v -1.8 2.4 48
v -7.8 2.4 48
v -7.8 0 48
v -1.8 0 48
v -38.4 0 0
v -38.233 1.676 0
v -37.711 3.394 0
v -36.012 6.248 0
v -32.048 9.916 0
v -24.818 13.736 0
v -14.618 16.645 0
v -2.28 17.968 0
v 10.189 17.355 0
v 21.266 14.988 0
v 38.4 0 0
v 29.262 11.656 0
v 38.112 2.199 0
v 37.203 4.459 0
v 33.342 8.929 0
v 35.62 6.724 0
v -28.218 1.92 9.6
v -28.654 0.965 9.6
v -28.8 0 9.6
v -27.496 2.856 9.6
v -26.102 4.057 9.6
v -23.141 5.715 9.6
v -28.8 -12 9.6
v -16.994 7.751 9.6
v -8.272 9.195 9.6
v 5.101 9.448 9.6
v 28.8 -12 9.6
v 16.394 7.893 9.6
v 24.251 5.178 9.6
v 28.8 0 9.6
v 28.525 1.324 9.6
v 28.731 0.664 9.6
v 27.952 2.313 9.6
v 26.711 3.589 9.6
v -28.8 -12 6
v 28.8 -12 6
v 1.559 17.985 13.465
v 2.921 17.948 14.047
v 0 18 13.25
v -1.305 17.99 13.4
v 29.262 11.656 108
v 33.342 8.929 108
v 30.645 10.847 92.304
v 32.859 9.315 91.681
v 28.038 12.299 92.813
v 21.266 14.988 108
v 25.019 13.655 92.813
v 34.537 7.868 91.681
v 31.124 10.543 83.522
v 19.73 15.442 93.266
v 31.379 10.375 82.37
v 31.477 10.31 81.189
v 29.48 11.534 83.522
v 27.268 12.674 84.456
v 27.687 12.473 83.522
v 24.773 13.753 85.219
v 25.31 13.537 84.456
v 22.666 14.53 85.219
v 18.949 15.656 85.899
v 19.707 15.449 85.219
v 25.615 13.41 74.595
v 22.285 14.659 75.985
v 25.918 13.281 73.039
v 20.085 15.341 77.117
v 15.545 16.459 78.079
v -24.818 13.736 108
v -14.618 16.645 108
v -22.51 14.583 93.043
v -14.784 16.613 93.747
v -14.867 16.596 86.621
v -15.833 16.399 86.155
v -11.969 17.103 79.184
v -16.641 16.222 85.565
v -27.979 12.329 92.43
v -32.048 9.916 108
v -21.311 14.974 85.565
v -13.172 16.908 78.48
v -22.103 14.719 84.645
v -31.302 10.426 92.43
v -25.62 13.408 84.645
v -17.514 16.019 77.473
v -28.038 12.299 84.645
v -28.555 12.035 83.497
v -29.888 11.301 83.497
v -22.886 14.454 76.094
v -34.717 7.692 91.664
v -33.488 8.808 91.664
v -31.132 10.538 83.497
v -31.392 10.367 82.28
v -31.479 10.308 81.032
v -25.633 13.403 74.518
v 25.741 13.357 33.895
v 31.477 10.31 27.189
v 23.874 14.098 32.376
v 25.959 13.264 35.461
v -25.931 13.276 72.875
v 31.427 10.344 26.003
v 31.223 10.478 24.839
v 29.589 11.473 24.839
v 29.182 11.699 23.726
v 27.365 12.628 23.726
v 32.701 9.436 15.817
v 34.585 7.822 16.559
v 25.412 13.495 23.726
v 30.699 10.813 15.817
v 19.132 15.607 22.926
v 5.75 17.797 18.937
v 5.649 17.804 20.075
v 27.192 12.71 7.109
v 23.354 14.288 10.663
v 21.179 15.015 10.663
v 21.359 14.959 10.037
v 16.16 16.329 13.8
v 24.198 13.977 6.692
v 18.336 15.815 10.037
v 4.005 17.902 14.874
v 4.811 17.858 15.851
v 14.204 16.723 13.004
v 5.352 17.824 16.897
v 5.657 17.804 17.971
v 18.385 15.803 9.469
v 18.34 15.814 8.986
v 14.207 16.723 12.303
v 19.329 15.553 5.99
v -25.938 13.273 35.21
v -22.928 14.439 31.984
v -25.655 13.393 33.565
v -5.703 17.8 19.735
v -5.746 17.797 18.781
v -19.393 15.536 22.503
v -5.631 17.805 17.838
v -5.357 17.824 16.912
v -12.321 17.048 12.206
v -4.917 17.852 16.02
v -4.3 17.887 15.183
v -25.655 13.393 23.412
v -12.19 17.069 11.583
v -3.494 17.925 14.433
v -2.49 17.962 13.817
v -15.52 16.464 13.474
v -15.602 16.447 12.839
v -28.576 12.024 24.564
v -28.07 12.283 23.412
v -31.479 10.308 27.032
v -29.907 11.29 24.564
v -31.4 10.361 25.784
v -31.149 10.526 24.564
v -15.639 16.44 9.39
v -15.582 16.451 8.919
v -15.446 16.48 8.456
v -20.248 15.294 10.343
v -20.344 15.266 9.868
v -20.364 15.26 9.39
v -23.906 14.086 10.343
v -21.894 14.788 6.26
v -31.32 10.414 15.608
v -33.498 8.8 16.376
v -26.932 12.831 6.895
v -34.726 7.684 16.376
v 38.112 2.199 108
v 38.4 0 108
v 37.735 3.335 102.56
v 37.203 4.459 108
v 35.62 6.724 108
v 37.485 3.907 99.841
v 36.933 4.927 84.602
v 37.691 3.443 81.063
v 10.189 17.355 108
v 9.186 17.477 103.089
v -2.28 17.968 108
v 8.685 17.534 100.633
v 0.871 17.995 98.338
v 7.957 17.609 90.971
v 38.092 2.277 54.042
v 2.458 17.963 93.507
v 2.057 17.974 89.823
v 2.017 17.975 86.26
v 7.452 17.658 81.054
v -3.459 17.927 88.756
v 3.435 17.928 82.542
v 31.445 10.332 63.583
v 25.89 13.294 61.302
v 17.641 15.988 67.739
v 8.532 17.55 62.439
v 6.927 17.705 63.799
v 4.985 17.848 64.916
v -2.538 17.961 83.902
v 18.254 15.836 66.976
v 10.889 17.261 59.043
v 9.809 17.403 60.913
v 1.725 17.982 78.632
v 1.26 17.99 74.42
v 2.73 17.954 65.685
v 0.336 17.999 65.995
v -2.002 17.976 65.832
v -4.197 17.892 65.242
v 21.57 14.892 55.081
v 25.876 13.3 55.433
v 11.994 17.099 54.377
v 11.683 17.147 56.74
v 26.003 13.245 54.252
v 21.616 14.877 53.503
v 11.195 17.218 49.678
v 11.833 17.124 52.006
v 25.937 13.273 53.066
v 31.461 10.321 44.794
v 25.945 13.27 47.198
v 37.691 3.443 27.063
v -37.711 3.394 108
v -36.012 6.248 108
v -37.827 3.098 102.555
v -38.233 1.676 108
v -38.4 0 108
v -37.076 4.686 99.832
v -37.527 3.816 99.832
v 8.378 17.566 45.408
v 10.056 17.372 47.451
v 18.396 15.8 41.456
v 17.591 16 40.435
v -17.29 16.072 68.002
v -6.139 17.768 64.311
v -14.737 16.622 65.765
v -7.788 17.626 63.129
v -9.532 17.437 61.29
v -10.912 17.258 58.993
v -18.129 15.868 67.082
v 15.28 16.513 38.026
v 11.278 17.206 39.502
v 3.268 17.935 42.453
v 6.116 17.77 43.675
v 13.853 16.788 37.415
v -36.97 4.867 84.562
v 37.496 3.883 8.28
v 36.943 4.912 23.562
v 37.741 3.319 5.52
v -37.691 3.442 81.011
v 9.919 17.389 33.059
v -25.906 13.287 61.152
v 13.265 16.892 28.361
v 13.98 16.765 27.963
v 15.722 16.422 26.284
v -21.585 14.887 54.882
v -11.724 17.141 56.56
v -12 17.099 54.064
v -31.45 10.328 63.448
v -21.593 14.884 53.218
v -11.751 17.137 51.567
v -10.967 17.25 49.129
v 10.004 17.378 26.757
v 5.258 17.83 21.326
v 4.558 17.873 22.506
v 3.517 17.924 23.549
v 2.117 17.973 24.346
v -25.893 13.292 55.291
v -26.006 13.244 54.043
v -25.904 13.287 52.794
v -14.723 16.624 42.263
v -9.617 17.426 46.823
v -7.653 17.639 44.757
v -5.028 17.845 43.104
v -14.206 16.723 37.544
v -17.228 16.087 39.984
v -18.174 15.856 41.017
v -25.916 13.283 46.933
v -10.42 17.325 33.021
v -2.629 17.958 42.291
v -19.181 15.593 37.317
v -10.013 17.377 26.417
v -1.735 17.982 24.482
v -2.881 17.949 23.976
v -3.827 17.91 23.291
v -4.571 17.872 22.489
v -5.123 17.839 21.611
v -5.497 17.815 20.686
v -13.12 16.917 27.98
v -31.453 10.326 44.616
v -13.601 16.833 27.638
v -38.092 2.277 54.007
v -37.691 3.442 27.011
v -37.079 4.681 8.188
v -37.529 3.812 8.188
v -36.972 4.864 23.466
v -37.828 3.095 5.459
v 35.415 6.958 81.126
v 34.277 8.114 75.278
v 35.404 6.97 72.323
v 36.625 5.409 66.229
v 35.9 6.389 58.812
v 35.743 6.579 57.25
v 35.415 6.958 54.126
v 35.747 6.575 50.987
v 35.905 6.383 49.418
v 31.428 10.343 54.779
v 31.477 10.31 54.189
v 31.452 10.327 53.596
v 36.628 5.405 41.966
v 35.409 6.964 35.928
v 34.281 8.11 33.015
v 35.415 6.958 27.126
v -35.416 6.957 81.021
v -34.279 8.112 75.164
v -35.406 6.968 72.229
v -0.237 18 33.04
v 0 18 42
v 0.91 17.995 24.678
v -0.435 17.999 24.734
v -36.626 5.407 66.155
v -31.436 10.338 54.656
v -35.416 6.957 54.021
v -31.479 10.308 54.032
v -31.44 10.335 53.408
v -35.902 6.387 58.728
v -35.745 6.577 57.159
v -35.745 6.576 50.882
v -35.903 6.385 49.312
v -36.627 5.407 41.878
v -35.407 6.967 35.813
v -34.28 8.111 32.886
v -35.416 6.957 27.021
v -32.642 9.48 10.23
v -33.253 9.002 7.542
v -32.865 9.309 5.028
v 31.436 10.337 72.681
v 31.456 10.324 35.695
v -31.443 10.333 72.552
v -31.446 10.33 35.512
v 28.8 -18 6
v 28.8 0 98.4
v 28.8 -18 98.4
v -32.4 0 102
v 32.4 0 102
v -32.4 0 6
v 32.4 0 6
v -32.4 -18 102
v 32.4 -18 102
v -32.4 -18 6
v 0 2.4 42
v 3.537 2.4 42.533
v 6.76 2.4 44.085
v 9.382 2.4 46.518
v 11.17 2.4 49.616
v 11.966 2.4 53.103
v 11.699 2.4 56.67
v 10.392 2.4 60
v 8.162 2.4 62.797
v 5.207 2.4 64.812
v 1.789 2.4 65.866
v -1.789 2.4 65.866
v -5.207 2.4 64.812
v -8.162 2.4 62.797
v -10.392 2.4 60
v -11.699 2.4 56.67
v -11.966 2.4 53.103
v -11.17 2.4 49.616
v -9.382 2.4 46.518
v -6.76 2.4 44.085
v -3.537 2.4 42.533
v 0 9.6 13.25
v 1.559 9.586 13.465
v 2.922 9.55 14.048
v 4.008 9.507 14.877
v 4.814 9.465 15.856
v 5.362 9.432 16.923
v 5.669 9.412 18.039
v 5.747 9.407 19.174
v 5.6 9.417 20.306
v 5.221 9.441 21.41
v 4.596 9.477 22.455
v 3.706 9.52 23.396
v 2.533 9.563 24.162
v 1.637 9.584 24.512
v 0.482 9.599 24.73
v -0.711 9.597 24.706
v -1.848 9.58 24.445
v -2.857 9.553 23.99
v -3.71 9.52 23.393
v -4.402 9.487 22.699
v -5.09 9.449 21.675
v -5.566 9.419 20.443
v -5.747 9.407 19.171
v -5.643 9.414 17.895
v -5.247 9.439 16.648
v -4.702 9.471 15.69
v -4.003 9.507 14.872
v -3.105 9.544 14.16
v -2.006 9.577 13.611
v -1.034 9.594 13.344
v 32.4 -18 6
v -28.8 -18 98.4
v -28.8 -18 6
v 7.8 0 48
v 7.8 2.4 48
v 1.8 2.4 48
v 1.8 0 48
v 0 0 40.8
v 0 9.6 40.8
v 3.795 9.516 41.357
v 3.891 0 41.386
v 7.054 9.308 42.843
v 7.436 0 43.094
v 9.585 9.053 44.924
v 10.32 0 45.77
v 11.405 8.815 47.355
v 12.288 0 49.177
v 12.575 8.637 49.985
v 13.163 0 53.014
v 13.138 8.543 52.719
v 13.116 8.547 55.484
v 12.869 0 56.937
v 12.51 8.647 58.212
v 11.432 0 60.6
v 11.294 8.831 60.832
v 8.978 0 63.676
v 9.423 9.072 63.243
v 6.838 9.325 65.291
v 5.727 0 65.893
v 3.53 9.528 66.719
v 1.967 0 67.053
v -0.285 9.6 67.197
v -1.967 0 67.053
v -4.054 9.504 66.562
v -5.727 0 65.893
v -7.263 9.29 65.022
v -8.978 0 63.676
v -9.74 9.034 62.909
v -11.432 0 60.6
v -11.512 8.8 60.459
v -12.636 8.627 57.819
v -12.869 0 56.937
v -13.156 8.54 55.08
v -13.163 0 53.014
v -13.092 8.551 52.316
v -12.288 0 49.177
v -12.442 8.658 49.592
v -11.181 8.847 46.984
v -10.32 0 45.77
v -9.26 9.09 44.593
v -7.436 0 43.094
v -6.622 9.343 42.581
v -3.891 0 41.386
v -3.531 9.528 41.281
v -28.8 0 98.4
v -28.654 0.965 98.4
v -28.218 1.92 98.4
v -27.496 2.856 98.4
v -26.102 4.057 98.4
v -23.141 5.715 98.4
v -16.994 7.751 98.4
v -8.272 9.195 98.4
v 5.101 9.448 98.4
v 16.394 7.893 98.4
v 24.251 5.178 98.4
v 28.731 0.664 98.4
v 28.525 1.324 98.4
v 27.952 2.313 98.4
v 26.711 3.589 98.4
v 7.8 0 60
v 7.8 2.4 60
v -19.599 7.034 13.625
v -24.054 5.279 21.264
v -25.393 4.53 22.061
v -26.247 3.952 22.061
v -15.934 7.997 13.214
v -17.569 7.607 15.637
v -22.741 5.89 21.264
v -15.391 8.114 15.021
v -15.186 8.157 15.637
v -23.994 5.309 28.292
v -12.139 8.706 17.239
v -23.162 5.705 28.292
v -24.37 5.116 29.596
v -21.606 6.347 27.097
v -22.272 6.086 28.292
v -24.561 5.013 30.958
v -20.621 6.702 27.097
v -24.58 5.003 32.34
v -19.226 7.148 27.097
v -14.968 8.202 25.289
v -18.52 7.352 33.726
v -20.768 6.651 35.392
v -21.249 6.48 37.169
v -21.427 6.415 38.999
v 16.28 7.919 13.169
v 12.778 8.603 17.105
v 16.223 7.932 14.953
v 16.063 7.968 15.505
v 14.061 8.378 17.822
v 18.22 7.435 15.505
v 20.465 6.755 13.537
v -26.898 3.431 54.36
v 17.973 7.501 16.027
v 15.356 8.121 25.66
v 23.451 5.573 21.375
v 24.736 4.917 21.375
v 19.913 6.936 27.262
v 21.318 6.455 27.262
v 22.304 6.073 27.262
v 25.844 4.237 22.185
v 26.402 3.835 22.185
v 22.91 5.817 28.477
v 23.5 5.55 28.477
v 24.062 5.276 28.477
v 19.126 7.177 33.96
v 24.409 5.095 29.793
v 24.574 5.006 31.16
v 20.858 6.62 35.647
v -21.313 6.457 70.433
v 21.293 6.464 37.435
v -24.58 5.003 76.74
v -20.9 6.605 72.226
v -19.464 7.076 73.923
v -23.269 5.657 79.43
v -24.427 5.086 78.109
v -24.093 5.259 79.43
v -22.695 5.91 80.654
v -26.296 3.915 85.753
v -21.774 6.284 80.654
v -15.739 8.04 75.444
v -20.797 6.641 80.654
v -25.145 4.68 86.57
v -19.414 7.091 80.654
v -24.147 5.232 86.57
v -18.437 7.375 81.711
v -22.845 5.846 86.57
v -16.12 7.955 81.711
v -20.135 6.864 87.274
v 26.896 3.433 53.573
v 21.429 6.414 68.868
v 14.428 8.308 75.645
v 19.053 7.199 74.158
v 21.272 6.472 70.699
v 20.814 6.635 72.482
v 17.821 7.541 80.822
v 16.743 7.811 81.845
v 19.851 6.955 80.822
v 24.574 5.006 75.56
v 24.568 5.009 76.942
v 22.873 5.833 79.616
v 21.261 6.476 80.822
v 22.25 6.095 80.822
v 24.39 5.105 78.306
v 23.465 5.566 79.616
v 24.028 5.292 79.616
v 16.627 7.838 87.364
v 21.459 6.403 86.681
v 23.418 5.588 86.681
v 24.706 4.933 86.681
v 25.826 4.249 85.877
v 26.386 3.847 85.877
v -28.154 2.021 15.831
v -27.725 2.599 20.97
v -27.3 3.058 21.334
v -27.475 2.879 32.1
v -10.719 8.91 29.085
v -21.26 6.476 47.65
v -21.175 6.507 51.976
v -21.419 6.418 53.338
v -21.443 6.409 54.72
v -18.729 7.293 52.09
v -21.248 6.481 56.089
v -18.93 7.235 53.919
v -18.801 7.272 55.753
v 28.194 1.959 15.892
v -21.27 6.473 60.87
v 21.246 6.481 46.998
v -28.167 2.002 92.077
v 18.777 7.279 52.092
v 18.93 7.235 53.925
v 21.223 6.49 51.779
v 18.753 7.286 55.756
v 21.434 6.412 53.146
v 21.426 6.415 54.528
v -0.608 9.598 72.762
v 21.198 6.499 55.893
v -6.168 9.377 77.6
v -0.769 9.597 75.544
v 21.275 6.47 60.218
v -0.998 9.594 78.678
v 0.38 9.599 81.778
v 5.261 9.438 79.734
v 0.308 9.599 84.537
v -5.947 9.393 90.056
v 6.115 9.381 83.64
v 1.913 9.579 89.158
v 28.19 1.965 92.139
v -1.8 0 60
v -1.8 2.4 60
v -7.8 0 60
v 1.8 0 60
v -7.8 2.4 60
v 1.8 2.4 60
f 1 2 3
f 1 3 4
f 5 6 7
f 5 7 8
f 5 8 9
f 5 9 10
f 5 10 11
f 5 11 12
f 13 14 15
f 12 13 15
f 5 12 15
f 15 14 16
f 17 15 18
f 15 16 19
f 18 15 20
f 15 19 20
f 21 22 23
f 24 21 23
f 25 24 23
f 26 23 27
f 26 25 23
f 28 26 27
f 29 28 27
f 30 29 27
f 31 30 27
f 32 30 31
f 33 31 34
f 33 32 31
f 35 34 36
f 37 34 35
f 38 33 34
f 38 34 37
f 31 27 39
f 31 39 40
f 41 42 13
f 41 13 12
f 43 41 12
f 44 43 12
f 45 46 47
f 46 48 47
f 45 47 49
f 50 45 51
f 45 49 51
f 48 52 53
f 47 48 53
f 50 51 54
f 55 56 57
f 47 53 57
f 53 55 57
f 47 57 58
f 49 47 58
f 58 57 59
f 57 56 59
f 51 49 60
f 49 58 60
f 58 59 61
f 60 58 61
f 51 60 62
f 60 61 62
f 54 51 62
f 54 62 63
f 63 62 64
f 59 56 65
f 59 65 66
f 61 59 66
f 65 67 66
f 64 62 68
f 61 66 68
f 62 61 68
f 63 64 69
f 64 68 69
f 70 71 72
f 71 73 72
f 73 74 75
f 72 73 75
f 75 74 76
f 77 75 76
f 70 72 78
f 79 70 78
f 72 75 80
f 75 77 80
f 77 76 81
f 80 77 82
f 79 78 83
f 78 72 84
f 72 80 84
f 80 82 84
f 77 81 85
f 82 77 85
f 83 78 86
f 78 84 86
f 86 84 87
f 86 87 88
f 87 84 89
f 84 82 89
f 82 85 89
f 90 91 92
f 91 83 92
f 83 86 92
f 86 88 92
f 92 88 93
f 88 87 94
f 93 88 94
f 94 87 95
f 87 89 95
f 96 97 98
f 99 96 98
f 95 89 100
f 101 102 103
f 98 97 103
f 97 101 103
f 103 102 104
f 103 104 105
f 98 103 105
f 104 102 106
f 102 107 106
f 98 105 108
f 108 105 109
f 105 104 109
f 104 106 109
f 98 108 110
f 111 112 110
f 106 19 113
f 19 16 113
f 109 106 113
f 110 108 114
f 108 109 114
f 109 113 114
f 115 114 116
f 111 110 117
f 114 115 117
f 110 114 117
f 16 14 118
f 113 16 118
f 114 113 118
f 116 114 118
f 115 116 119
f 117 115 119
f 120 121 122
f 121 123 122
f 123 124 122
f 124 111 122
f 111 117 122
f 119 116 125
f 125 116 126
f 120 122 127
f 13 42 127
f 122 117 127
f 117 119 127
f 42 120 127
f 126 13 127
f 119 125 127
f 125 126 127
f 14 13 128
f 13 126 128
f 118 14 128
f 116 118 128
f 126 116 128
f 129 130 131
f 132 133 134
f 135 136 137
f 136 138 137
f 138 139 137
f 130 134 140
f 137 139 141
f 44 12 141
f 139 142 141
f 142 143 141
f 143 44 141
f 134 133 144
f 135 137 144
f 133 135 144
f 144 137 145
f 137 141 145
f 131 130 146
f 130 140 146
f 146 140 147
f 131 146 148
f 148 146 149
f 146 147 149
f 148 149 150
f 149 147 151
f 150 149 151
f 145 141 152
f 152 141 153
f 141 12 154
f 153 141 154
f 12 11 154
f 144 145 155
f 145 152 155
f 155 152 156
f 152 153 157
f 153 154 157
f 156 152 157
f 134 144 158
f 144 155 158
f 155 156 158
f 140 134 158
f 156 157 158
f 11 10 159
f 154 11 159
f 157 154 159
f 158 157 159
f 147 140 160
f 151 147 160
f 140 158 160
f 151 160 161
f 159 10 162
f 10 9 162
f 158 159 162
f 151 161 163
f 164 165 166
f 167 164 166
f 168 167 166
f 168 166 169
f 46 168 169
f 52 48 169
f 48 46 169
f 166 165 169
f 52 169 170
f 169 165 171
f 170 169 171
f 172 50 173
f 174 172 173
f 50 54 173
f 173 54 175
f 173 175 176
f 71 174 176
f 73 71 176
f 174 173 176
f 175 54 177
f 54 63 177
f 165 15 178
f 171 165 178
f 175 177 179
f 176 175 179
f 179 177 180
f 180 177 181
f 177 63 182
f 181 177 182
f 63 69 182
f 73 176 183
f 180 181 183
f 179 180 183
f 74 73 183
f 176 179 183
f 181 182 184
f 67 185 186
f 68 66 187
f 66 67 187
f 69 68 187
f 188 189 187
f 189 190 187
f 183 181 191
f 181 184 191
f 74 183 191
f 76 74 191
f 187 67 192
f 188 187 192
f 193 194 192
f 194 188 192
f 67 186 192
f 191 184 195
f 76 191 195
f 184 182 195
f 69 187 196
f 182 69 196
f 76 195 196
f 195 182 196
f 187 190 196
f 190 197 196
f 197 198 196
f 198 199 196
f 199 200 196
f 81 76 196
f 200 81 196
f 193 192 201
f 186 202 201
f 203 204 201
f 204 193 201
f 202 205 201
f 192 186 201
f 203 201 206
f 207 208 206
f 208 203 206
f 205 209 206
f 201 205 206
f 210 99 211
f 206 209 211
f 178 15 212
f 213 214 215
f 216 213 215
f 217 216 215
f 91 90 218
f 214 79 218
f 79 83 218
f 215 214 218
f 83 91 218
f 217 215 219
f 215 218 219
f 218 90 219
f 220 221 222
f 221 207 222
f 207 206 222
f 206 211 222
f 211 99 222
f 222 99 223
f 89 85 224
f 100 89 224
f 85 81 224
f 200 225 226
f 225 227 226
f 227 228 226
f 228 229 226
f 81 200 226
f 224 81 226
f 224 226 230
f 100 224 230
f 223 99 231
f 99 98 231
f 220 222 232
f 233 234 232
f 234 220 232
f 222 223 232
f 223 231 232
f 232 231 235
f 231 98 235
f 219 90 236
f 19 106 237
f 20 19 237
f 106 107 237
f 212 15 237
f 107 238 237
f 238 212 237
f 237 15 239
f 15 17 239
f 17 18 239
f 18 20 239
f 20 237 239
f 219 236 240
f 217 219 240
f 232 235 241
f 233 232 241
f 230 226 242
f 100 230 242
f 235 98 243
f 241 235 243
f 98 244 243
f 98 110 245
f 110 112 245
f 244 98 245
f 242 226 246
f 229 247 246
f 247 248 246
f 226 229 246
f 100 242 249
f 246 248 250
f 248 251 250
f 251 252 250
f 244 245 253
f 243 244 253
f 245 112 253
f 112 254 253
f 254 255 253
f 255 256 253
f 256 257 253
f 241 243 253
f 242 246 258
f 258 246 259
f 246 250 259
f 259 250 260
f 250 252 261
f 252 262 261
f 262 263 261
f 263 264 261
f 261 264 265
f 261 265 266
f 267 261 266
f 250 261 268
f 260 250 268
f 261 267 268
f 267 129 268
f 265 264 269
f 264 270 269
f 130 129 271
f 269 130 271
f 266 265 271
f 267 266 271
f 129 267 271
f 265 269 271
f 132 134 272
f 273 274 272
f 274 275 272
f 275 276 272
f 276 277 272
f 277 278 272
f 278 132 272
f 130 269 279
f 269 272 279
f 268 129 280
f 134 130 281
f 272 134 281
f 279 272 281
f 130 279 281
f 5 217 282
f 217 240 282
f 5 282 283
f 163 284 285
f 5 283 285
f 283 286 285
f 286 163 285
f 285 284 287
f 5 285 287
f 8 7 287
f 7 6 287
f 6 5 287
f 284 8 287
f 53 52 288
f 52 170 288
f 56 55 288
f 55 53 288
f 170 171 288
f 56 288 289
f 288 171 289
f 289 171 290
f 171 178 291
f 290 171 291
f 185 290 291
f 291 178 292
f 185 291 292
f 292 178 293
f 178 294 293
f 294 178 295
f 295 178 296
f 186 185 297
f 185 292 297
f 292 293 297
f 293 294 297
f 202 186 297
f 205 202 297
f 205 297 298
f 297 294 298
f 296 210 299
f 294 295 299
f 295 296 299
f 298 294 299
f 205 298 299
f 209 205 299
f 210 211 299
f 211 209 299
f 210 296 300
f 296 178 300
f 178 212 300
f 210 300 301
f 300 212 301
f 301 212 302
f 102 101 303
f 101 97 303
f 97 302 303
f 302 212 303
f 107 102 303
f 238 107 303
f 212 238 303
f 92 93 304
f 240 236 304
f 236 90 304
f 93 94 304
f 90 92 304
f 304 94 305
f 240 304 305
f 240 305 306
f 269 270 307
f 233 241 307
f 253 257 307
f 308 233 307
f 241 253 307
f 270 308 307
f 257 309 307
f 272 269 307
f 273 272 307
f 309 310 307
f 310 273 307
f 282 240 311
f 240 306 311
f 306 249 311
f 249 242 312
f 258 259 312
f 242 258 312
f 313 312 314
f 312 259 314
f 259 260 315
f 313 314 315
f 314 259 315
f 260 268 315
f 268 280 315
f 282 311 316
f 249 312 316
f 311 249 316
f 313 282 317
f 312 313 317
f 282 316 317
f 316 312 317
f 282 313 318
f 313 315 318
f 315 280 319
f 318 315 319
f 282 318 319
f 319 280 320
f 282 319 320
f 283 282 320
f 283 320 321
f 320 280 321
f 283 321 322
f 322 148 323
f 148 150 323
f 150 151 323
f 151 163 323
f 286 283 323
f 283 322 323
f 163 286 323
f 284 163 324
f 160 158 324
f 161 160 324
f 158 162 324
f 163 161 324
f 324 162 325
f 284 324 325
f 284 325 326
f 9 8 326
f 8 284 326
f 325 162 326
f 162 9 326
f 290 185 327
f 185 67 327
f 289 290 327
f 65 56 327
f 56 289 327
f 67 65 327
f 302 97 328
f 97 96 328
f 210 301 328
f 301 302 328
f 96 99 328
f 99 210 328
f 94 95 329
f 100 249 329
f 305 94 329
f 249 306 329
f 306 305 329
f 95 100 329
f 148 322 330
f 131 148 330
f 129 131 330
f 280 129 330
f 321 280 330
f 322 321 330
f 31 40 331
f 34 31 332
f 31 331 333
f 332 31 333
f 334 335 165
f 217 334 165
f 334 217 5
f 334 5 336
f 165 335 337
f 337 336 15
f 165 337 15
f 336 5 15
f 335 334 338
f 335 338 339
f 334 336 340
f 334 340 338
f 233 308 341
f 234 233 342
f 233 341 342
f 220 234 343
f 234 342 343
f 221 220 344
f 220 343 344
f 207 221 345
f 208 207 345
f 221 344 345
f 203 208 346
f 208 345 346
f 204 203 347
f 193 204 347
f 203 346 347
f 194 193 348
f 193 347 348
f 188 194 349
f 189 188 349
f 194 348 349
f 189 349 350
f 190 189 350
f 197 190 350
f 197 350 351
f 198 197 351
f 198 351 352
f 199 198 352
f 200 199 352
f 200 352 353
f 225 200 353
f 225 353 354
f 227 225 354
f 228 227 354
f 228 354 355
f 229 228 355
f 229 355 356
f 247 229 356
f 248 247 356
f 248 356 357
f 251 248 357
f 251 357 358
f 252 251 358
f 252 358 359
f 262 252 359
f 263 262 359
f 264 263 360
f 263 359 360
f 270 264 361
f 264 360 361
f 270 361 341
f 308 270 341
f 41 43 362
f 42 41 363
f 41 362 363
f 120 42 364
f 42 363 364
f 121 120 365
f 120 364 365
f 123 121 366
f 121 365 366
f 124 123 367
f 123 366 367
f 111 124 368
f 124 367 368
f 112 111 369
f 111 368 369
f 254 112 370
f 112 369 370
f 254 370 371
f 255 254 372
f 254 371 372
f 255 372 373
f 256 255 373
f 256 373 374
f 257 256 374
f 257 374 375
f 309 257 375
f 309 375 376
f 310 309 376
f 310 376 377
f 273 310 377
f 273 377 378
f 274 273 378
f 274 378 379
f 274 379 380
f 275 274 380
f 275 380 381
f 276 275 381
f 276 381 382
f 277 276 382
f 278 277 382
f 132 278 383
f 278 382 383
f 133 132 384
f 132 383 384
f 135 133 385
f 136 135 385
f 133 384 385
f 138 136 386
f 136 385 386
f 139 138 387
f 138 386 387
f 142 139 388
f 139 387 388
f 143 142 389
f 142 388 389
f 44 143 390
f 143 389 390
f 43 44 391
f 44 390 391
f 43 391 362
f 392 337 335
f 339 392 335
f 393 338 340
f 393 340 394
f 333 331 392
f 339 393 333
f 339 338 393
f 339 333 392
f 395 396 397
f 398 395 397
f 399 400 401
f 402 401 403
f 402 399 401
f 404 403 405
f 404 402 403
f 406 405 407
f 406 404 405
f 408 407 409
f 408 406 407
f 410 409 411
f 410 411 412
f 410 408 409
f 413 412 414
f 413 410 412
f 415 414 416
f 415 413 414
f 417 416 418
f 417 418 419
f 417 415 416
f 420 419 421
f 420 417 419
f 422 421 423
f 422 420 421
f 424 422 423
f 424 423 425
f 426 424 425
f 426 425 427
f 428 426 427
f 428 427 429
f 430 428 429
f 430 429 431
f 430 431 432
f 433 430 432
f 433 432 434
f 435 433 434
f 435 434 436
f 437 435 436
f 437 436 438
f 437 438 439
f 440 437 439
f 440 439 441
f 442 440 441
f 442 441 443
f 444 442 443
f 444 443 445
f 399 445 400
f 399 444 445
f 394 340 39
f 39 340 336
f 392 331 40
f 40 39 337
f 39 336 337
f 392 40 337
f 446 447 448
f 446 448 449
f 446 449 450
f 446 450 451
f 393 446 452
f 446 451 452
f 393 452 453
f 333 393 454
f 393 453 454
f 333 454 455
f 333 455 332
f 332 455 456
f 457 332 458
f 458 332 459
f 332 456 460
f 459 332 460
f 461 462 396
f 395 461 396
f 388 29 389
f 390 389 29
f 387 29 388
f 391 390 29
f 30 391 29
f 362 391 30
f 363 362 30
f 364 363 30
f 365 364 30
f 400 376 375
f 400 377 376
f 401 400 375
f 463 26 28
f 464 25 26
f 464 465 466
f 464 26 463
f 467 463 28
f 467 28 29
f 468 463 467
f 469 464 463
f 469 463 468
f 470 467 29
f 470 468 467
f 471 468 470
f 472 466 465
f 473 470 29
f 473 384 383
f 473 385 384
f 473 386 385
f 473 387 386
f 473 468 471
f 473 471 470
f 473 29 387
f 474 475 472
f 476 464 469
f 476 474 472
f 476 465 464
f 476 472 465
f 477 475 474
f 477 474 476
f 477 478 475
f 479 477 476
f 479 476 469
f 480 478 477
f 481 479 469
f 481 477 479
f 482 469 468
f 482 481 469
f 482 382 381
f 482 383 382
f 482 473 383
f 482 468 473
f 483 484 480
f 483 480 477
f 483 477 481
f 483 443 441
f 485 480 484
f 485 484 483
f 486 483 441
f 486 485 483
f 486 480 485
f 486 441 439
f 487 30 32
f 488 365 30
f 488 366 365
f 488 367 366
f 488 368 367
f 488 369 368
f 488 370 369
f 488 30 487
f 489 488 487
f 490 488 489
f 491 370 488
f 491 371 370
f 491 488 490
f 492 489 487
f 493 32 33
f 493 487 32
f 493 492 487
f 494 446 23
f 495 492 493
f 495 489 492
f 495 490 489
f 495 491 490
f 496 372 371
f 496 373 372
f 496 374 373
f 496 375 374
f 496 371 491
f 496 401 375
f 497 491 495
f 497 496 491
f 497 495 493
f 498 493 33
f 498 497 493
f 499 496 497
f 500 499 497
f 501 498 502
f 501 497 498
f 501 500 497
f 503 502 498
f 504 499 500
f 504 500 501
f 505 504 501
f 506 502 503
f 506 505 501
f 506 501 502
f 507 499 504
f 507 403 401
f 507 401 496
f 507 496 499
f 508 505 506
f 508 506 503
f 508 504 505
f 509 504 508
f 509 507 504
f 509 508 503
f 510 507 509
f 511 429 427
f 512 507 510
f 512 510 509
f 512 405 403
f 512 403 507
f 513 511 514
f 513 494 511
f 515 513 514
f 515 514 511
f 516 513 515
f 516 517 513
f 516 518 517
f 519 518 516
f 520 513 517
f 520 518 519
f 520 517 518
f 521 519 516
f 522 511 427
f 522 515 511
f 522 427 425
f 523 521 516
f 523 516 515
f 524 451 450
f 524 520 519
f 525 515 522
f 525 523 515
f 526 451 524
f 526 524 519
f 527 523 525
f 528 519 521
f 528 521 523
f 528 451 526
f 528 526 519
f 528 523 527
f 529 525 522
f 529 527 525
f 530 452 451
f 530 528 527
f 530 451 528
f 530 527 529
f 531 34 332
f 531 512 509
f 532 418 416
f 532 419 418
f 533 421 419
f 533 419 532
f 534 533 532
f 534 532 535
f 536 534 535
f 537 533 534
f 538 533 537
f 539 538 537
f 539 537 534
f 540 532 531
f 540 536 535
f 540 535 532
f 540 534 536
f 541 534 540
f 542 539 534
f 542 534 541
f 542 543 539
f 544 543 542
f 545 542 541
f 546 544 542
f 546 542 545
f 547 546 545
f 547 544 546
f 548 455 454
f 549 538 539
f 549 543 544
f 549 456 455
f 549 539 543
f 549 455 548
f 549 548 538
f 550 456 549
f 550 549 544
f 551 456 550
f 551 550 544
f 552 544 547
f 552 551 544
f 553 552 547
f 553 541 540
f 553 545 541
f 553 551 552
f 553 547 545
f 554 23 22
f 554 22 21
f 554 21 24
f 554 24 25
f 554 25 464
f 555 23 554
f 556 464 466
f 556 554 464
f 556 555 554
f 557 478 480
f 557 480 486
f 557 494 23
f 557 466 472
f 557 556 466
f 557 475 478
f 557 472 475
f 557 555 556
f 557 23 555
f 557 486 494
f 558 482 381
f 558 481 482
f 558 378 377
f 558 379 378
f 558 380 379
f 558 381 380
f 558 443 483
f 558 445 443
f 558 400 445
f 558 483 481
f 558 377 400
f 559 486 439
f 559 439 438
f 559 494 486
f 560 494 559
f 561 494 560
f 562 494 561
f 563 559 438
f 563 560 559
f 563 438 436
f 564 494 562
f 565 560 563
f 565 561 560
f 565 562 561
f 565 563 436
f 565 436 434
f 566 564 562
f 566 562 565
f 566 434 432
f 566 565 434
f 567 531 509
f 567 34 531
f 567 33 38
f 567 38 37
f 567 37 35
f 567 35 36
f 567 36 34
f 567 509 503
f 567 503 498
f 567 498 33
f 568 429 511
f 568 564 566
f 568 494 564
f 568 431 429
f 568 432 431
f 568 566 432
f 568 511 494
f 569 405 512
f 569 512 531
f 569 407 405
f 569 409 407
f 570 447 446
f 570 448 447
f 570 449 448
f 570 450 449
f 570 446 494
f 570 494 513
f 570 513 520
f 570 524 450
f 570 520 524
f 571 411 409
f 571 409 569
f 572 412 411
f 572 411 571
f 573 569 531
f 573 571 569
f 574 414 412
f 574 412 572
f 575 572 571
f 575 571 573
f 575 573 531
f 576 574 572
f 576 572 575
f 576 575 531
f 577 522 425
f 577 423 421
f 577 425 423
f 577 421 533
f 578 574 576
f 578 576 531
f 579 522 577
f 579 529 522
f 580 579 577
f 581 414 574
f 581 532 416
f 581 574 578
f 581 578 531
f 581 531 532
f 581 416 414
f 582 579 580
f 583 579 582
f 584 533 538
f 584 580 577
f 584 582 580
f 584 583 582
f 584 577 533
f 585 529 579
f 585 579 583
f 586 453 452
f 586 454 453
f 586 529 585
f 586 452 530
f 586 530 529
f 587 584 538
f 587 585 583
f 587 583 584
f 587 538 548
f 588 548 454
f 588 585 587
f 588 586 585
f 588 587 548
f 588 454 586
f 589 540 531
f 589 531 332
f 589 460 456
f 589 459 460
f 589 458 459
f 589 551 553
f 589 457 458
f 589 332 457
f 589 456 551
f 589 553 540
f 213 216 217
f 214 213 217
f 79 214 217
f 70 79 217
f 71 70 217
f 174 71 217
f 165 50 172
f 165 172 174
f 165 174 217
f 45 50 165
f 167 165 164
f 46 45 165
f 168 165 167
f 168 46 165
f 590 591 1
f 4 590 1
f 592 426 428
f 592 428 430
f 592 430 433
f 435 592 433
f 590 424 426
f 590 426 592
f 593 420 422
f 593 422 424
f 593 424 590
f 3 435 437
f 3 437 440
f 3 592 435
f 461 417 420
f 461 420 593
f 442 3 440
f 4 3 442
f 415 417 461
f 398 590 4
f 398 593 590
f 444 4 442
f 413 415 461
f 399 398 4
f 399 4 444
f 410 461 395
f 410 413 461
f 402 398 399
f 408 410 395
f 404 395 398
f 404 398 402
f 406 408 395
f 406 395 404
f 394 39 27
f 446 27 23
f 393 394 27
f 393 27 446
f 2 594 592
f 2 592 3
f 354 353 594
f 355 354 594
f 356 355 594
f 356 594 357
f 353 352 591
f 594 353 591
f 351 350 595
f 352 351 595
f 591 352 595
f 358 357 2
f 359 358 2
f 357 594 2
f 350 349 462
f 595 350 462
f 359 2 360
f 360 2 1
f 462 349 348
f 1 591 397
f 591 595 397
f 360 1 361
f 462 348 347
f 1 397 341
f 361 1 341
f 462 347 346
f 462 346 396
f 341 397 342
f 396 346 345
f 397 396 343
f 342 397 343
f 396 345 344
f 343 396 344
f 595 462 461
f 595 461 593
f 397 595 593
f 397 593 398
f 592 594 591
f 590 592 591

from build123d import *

# Parameters (mm, degrees)
EXTRUDE_1_DEPTH     = 90
SKETCH_2_W          = 54
SKETCH_2_H          = 80
SKETCH_2_W_2        = 48
SKETCH_2_H_2        = 74
EXTRUDE_2_DEPTH     = 15
SKETCH_3_W          = 48
SKETCH_3_H          = 3
CUT_EXTRUDE_1_DEPTH = 5
SKETCH_5_RX         = 24
SKETCH_5_RY         = 8
CUT_EXTRUDE_3_DEPTH = 74
EXTRUDE_9_REACH     = 98.69
SKETCH_15_R         = 11
SKETCH_16_R         = 10
CUT_EXTRUDE_4_DEPTH = 98.020616492
SKETCH_17_W         = 5
SKETCH_17_H         = 10
CUT_EXTRUDE_6_DEPTH = 98.020616492
SCALE_1_SCALE       = 1.2
SKETCH_18_R         = 5.75
CUT_EXTRUDE_7_DEPTH = 117.028272558


with BuildPart() as part:
    # 草图1 → 凸台-拉伸1 (new body)
    with BuildSketch(Plane.XY):
        with BuildLine():
            Line((-32, 0), (32, 0))
            add(Edge.make_bspline(
                [(32, 0), (32, 15), (0, 15), (-32, 15), (-32, 0)],
                knots=[0, 0, 0, 1.570796327, 1.570796327, 3.141592654, 3.141592654, 3.141592654], degree=2, weights=[1, 0.707106781, 1, 0.707106781, 1]))
        make_face()
    extrude(amount=EXTRUDE_1_DEPTH)

    # 草图2 → 凸台-拉伸2 (add)
    with BuildSketch(Plane.XZ):
        with Locations((0, 45)):
            Rectangle(SKETCH_2_W, SKETCH_2_H)
        with Locations((0, 45)):
            Rectangle(SKETCH_2_W_2, SKETCH_2_H_2, mode=Mode.SUBTRACT)
    extrude(amount=EXTRUDE_2_DEPTH)

    # 草图3 → 切除-拉伸1 (cut)
    with BuildSketch(Plane.XZ.offset(15)):
        with Locations((0, 6.5)):
            Rectangle(SKETCH_3_W, SKETCH_3_H)
    extrude(amount=-CUT_EXTRUDE_1_DEPTH, mode=Mode.SUBTRACT)

    # 草图5 → 切除-拉伸3 (cut)
    with BuildSketch(Plane(origin=(0, 0, 82), x_dir=(-1, 0, 0), z_dir=(0, 0, -1))):
        with Locations(Location((0, 0), (0, 0, 180))):
            Ellipse(SKETCH_5_RX, SKETCH_5_RY)
    extrude(amount=CUT_EXTRUDE_3_DEPTH, mode=Mode.SUBTRACT)

    # 草图15 → 凸台-拉伸9 (add, up to next)
    with BuildSketch(Plane(origin=(0, 0, 0), x_dir=(-1, 0, 0), z_dir=(0, -1, 0)), mode=Mode.PRIVATE) as extrude_9_sk1:
        with Locations(Location((0, -45, 0), (0, 0, 90))):
            Circle(SKETCH_15_R)
    extrude_9_tool1 = extrude(extrude_9_sk1.sketch, amount=-EXTRUDE_9_REACH, mode=Mode.PRIVATE) - part.part
    add(extrude_9_tool1.solids().sort_by_distance((0, 0, 45))[0])

    # 草图16 → 切除-拉伸4 (cut, through all)
    with BuildSketch(Plane(origin=(0, 2, 0), x_dir=(-1, 0, 0), z_dir=(0, -1, 0))):
        with Locations(Location((0, -45, 0), (0, 0, 90))):
            Circle(SKETCH_16_R)
    extrude(amount=-CUT_EXTRUDE_4_DEPTH, mode=Mode.SUBTRACT)

    # 草图17 → 切除-拉伸6 (cut, through all)
    with BuildSketch(Plane(origin=(0, 2, 0), x_dir=(1, 0, 0), z_dir=(0, 1, 0))):
        with Locations((-4, -45)):
            Rectangle(SKETCH_17_W, SKETCH_17_H)
    cut_extrude_6 = extrude(amount=-CUT_EXTRUDE_6_DEPTH, mode=Mode.SUBTRACT)

    # 镜向1: 切除-拉伸6 across plane
    add(cut_extrude_6.mirror(Plane(origin=(0, 0, 0), x_dir=(0, 0, 1), z_dir=(1, 0, 0))), mode=Mode.SUBTRACT)


with BuildPart() as part_1:
    # 缩放比例1: scaled about (0, 0, 0)
    add(part.part.scale(SCALE_1_SCALE))

    # 草图18 → 切除-拉伸7 (cut, through all)
    with BuildSketch(Plane.XZ):
        with Locations(Location((0, 19, 0), (0, 0, 270))):
            Circle(SKETCH_18_R)
    extrude(amount=-CUT_EXTRUDE_7_DEPTH, mode=Mode.SUBTRACT)


solid = part_1.part
